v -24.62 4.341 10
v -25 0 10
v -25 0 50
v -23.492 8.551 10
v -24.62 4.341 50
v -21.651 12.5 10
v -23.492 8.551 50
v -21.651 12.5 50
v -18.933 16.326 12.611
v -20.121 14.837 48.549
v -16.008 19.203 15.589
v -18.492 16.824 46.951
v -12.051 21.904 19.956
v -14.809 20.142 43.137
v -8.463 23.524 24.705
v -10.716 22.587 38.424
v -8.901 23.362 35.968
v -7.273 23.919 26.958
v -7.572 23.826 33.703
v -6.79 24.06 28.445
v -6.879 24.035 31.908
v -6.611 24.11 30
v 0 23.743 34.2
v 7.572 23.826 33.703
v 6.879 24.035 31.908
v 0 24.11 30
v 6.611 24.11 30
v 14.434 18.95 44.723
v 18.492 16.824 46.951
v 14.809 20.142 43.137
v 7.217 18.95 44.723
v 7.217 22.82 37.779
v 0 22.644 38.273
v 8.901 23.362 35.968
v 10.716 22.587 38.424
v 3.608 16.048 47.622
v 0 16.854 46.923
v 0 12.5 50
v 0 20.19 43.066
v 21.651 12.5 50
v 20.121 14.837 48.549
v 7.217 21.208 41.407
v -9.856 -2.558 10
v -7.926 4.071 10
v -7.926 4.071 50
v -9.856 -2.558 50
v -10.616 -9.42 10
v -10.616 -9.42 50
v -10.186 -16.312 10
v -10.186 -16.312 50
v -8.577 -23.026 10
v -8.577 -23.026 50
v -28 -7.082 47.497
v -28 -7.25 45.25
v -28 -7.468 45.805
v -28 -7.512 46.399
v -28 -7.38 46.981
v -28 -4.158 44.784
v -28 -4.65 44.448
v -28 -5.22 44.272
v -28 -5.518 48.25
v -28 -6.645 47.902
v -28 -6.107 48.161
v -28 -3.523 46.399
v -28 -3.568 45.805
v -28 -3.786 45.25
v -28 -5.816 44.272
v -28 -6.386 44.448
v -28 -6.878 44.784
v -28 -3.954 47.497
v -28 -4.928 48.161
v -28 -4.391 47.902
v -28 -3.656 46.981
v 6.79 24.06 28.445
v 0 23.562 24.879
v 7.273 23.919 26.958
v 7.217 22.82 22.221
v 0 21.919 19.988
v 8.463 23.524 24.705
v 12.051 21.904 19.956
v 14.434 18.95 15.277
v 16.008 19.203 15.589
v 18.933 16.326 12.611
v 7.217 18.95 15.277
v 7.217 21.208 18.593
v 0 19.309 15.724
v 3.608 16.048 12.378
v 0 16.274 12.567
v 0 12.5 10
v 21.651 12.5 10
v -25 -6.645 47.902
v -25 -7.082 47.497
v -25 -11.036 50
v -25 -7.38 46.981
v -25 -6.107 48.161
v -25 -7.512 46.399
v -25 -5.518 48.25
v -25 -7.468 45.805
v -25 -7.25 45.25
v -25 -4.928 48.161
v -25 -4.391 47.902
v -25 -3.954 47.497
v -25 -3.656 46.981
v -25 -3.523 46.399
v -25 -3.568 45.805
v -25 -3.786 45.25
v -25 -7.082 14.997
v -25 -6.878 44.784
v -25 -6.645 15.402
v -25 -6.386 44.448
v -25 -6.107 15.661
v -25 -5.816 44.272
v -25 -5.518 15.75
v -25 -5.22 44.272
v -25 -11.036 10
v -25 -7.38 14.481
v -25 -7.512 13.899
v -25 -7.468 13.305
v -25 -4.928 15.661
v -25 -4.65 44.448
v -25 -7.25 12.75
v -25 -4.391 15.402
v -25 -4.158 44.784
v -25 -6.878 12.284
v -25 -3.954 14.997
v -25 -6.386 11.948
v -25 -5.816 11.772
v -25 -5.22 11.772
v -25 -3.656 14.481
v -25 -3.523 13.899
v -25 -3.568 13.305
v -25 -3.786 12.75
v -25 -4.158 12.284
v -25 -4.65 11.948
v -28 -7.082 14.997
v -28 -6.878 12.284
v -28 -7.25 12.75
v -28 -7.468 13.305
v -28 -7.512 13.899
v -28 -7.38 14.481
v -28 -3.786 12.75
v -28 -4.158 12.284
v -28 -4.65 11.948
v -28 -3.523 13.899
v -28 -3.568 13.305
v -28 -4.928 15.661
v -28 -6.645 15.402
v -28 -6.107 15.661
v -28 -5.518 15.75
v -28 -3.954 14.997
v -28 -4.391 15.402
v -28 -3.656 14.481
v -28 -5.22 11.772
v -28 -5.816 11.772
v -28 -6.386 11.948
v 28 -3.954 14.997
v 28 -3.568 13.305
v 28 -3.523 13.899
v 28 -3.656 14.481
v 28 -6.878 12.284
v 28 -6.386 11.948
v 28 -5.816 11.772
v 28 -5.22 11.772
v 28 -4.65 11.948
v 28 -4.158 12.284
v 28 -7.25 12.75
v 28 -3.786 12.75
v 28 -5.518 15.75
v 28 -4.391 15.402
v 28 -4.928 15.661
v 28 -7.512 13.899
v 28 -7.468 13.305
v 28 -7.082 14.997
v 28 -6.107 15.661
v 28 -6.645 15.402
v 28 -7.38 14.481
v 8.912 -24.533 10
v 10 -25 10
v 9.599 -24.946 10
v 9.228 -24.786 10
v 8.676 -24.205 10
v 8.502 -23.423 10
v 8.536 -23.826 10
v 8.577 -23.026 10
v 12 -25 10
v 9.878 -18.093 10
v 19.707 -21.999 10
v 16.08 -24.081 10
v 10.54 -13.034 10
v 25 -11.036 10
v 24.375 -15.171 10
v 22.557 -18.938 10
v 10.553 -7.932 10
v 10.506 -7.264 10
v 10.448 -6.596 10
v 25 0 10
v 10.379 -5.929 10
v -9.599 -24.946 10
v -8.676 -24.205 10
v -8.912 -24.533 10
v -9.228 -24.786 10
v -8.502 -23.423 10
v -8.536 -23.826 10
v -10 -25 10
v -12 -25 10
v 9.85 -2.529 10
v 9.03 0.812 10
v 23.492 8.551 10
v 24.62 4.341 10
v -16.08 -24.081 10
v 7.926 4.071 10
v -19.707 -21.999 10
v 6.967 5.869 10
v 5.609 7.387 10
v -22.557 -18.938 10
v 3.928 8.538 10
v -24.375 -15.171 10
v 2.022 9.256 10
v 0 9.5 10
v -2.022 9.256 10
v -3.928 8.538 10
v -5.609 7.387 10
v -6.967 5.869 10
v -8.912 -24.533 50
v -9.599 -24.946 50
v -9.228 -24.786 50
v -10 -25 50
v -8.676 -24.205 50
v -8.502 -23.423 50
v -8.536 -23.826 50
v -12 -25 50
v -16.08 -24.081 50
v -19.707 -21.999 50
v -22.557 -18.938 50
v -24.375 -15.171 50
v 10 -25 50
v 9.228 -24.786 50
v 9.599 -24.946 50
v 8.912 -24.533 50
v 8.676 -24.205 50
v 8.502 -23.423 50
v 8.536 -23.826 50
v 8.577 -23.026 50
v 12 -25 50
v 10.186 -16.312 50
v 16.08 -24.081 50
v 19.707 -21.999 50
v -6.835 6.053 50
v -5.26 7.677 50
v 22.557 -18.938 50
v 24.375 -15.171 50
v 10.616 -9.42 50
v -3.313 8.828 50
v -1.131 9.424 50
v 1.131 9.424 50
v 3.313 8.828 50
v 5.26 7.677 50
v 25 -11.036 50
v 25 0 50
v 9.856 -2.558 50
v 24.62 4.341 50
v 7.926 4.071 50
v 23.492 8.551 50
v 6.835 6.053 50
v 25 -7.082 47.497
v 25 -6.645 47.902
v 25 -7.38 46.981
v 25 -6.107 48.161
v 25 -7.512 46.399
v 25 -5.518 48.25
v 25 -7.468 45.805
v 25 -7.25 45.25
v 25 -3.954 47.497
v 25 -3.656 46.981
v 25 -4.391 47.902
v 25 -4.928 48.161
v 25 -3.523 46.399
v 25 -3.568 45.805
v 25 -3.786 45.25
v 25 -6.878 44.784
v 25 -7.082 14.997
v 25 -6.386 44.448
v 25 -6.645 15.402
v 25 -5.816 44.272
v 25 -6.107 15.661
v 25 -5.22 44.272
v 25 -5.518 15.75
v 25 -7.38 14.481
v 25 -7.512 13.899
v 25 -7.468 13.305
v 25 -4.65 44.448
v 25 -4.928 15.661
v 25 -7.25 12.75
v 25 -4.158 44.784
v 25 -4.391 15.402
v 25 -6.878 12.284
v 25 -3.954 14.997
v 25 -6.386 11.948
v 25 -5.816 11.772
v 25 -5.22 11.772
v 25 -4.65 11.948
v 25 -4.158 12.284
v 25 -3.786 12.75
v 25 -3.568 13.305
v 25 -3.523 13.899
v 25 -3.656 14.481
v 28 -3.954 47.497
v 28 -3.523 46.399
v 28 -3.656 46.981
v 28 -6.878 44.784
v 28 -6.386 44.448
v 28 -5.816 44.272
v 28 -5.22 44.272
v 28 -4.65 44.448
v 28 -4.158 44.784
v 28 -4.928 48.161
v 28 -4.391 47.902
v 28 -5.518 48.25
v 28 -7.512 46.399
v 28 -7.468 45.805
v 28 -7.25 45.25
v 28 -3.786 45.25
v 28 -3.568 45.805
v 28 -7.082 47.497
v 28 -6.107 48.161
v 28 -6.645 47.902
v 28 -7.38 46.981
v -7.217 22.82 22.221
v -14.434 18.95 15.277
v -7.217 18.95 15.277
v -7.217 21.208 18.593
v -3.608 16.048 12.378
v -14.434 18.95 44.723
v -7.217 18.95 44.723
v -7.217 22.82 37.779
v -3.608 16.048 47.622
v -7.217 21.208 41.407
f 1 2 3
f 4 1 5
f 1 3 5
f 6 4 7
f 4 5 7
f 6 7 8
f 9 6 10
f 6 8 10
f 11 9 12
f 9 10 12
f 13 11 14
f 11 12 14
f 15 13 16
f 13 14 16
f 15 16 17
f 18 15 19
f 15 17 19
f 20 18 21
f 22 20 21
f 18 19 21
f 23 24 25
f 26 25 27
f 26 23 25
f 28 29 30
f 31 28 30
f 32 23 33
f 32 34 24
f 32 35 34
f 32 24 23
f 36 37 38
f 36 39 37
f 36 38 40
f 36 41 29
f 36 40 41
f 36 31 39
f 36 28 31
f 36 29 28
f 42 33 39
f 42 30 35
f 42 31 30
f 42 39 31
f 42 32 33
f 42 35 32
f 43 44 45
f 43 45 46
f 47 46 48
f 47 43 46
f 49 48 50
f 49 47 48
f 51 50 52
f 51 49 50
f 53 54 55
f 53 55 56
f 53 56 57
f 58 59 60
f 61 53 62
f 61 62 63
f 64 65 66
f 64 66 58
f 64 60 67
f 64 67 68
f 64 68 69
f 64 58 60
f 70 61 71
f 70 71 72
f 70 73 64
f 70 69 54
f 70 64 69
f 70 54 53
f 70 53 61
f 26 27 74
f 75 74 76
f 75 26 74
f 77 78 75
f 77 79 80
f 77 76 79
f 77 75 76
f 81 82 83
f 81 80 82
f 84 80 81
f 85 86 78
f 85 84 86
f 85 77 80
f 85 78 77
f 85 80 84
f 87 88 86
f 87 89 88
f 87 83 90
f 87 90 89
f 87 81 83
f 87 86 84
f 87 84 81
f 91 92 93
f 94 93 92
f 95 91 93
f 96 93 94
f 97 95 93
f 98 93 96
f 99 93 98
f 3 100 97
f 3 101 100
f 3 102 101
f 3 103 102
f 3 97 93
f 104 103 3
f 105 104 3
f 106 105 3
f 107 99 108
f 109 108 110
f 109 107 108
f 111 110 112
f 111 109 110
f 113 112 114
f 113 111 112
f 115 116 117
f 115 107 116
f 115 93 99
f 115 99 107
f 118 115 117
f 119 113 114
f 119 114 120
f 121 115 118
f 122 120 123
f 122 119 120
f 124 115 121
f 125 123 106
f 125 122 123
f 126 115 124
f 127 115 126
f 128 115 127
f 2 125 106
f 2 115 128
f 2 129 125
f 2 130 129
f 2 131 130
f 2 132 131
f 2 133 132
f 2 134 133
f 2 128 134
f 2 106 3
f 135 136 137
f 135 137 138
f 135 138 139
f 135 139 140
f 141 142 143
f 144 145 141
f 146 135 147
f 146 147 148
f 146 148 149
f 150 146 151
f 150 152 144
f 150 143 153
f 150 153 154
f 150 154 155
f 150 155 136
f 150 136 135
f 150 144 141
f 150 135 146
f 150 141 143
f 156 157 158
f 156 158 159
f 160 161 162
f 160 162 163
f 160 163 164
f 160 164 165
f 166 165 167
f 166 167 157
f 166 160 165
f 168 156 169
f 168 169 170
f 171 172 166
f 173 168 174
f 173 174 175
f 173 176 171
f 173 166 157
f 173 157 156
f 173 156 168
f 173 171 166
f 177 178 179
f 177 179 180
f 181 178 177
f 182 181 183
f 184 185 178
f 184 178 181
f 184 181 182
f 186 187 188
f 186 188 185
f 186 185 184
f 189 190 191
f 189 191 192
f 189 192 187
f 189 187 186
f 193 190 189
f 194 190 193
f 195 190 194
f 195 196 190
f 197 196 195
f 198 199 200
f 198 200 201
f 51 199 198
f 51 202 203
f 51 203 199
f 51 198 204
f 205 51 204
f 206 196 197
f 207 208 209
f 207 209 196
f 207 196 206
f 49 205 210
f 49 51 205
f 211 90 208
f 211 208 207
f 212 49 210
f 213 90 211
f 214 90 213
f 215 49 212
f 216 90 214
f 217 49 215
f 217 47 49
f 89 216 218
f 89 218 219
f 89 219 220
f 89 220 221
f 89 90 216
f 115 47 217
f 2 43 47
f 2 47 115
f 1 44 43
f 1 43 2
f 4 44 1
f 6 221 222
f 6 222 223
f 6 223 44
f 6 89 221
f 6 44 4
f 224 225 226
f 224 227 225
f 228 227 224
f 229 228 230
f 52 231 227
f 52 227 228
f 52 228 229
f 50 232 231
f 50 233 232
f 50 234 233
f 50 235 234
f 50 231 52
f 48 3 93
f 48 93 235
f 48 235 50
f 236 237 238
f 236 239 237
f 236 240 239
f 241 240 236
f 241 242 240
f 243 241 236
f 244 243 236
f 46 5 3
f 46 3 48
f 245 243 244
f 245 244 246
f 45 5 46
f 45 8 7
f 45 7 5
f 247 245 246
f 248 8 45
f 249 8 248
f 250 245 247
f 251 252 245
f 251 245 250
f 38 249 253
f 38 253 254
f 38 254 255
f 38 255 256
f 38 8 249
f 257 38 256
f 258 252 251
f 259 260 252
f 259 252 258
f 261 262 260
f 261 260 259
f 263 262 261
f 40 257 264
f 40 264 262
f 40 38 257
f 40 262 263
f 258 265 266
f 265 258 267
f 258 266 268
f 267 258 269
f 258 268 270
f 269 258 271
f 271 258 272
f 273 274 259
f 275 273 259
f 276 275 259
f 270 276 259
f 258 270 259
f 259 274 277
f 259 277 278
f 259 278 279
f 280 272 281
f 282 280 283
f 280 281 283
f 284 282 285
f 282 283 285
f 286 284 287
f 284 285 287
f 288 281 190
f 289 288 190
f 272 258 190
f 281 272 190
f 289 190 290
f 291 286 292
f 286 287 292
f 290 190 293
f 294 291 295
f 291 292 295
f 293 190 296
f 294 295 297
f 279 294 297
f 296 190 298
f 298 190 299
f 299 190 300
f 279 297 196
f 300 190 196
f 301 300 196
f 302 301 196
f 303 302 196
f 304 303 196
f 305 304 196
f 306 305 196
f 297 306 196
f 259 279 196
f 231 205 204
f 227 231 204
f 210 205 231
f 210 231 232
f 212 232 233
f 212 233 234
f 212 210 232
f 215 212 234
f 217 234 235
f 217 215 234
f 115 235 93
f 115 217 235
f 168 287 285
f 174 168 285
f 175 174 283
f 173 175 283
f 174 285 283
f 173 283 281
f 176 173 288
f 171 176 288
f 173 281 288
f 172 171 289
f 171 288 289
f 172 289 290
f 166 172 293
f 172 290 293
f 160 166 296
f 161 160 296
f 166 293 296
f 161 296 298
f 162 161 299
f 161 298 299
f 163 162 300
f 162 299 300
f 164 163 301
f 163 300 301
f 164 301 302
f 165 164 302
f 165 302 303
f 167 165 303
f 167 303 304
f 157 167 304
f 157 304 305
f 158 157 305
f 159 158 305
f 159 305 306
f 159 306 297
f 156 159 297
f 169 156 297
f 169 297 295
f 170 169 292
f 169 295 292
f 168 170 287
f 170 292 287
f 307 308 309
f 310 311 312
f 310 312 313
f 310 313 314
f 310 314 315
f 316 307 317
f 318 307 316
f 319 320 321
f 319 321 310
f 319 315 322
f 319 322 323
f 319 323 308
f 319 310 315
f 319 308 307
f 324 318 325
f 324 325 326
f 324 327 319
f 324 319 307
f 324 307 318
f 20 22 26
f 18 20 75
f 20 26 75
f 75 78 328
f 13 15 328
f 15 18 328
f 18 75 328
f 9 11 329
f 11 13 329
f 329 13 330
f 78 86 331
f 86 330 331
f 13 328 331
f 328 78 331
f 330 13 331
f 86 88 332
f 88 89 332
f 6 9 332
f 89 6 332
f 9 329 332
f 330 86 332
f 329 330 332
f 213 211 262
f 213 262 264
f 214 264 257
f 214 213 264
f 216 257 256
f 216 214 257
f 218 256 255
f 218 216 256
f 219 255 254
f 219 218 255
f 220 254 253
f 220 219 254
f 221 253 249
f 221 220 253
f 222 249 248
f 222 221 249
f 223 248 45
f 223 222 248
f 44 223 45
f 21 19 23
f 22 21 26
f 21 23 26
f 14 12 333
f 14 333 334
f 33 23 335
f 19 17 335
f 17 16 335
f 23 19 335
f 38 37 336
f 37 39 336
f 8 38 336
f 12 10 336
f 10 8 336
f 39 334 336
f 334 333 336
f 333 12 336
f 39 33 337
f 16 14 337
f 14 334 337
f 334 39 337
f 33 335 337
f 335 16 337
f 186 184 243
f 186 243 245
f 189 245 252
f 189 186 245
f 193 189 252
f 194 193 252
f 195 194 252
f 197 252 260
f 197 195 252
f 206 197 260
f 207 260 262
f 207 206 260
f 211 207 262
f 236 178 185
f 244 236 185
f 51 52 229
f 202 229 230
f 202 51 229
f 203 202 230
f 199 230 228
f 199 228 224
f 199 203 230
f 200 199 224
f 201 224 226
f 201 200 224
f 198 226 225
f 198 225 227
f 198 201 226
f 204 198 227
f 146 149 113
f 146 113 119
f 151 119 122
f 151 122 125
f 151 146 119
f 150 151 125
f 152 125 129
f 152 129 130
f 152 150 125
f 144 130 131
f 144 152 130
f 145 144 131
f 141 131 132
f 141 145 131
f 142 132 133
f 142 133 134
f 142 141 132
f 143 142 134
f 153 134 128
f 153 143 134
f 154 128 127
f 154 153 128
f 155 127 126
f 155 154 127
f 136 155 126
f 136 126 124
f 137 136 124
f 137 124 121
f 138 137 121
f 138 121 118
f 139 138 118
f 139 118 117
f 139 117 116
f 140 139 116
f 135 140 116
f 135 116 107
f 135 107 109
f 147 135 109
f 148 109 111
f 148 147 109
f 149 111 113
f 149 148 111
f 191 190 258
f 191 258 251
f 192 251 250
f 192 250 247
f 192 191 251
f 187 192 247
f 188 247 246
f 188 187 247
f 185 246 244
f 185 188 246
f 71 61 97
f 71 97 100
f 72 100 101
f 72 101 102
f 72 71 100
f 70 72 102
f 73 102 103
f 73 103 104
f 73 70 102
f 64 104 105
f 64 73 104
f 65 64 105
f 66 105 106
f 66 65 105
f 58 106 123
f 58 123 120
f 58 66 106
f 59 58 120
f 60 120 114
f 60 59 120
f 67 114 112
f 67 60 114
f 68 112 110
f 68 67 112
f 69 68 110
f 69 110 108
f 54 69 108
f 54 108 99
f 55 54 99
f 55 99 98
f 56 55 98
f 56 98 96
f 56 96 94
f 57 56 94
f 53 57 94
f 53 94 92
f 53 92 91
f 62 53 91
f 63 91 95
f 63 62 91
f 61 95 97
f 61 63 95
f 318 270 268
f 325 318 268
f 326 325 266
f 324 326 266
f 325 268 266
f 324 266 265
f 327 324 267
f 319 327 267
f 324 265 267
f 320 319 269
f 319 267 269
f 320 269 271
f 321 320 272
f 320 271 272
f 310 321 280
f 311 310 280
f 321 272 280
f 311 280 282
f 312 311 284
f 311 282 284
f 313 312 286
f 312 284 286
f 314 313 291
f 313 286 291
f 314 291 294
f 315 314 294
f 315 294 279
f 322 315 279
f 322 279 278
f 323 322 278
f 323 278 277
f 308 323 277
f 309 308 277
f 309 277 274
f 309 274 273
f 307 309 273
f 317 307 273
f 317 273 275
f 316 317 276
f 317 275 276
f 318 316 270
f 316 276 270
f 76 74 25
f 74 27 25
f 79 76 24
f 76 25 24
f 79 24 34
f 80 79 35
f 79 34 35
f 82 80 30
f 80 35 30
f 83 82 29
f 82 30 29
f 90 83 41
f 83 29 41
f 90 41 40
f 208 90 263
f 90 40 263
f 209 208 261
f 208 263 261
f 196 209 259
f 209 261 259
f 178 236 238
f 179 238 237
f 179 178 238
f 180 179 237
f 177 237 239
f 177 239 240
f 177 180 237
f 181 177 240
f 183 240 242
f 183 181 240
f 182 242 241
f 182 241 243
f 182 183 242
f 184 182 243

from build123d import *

# Parameters (mm, degrees)
SKETCH1_W                           = 50
SKETCH1_H                           = 50
BOSS_EXTRUDE1_DEPTH                 = 60
CUT_EXTRUDE1_DEPTH                  = 60
CUT_EXTRUDE2_START                  = -60
CUT_EXTRUDE2_DEPTH                  = 60
SKETCH5_OUTSIDE_W                   = 70.548
SKETCH5_OUTSIDE_H                   = 70.548
CUT_EXTRUDE3_DEPTH                  = 10
CUT_EXTRUDE4_DEPTH                  = 10
FILLET1_R                           = 1
SKETCH7_R                           = 2
BOSS_EXTRUDE2_DEPTH                 = 2
BOSS_EXTRUDE3_START                 = 2
SKETCH8_R                           = 2
BOSS_EXTRUDE3_DEPTH                 = 2
SKETCH9_R                           = 2.25
CUT_EXTRUDE5_DEPTH                  = 2
CUT_EXTRUDE6_START                  = -2
SKETCH10_R                          = 2.25
CUT_EXTRUDE6_DEPTH                  = 2
FILLET2_R                           = 1
CUT_EXTRUDE7_REACH                  = 71.642
CUT_EXTRUDE7_END_RADIUS             = 25
CUT_EXTRUDE7_DIRECTION_2_REACH      = 71.642
CUT_EXTRUDE7_DIRECTION_2_END_RADIUS = 25
SKETCH12_W                          = 10
SKETCH12_H                          = 10
CUT_EXTRUDE8_DEPTH                  = 29.758852585
SKETCH13_W                          = 10
SKETCH13_H                          = 14.003619208
CUT_EXTRUDE9_DEPTH                  = 31.758852585
SKETCH14_R                          = 2
BOSS_EXTRUDE4_DEPTH                 = 3
BOSS_EXTRUDE5_START                 = 3
SKETCH15_R                          = 2
BOSS_EXTRUDE5_DEPTH                 = 3


# Read off the part's stored shape, not the designer's step: Cut-Extrude2
with BuildPart() as part:
    # Sketch1 → Boss-Extrude1 (new body)
    with BuildSketch(Plane.XY):
        Rectangle(SKETCH1_W, SKETCH1_H)
    extrude(amount=BOSS_EXTRUDE1_DEPTH)

    # Sketch3 → Cut-Extrude1 (cut)
    with BuildSketch(Plane.XY.offset(60)):
        with BuildLine():
            Line((-25, 25), (-25, 0))
            ThreePointArc((-25, 0), (-17.677669541, 17.677669518), (-3.2e-08, 25))
            Line((-3.2e-08, 25), (-25, 25))
        make_face()
        with BuildLine():
            Line((25, 25), (-3.2e-08, 25))
            ThreePointArc((-3.2e-08, 25), (17.677669518, 17.677669541), (25, 0))
            Line((25, 0), (25, 25))
        make_face()
    extrude(amount=-CUT_EXTRUDE1_DEPTH, mode=Mode.SUBTRACT)

    # Cut-Extrude2 outline → Cut-Extrude2 (cut)
    with BuildSketch(Plane.XY.offset(60).offset(CUT_EXTRUDE2_START)):
        with BuildLine():
            ThreePointArc((8.576916353, -23.025834486), (10.616475204, -9.420494413), (7.92577262, 4.071177033))
            ThreePointArc((7.92577262, 4.071177033), (0, 9.5), (-7.92577262, 4.071177033))
            ThreePointArc((-7.92577262, 4.071177033), (-10.616475204, -9.420494413), (-8.576916353, -23.025834486))
            ThreePointArc((-8.576916353, -23.025834486), (-8.783191003, -24.377140732), (-10, -25))
            Line((-10, -25), (10, -25))
            ThreePointArc((10, -25), (8.783191003, -24.377140732), (8.576916353, -23.025834486))
        make_face()
        with BuildLine():
            ThreePointArc((25, -11.035759956), (21.246950766, -20.57515197), (12, -25))
            Line((12, -25), (25, -25))
            Line((25, -25), (25, -11.035759956))
        make_face()
        with BuildLine():
            Line((-25, -25), (-12, -25))
            ThreePointArc((-12, -25), (-21.246950766, -20.57515197), (-25, -11.035759956))
            Line((-25, -11.035759956), (-25, -25))
        make_face()
    extrude(amount=CUT_EXTRUDE2_DEPTH, mode=Mode.SUBTRACT)

    # Sketch5 outside → Cut-Extrude3 (cut)
    with BuildSketch(Plane.XY.offset(60)):
        Rectangle(SKETCH5_OUTSIDE_W, SKETCH5_OUTSIDE_H)
        with BuildLine():
            Line((-7.92577262, 4.071177033), (-12.879426293, 4.071177033))
            Line((-12.879426293, 4.071177033), (-12.879426293, -5.928822967))
            Line((-12.879426293, -5.928822967), (-10.379426293, -5.928822967))
            ThreePointArc((-10.379426293, -5.928822967), (-9.475712618, -0.849542187), (-7.92577262, 4.071177033))
        make_face(mode=Mode.SUBTRACT)
        with BuildLine():
            Line((7.92577262, 4.071177033), (12.879426293, 4.071177033))
            Line((12.879426293, 4.071177033), (12.879426293, -5.928822967))
            Line((12.879426293, -5.928822967), (10.379426293, -5.928822967))
            ThreePointArc((10.379426293, -5.928822967), (9.475712618, -0.849542187), (7.92577262, 4.071177033))
        make_face(mode=Mode.SUBTRACT)
    extrude(amount=-CUT_EXTRUDE3_DEPTH, mode=Mode.SUBTRACT)

    # Sketch6 → Cut-Extrude4 (cut)
    # profile 1 of 4: a face of its own
    with BuildSketch(Plane(origin=(0, 0, 0), x_dir=(-1, 0, 0), z_dir=(0, 0, -1))):
        with BuildLine():
            Line((0, 9.5), (0, 25))
            ThreePointArc((0, 25), (-17.67766953, 17.67766953), (-25, 0))
            Line((-25, 0), (-25, -11.035759956))
            ThreePointArc((-25, -11.035759956), (-21.246950766, -20.57515197), (-12, -25))
            Line((-12, -25), (-10, -25))
            ThreePointArc((-10, -25), (-8.783191003, -24.377140732), (-8.576916353, -23.025834486))
            ThreePointArc((-8.576916353, -23.025834486), (-10.289550459, -15.574005024), (-10.552980025, -7.932442175))
            ThreePointArc((-10.552980025, -7.932442175), (-10.478797406, -6.929541656), (-10.379426293, -5.928822967))
            ThreePointArc((-10.379426293, -5.928822967), (-9.475712618, -0.849542187), (-7.92577262, 4.071177033))
            ThreePointArc((-7.92577262, 4.071177033), (-4.803383975, 8.012667281), (0, 9.5))
        make_face()
        with BuildLine():
            Line((-12.879426293, 6.071177033), (-12.879426293, 3.071177033))
            Line((-12.879426293, 3.071177033), (-12.879426293, -4.928822967))
            Line((-12.879426293, -4.928822967), (-12.879426293, -7.932442175))
            Line((-12.879426293, -7.932442175), (-14.879423018, -7.932442175))
            ThreePointArc((-14.879423018, -7.932442175), (-15.586532115, -7.639547997), (-15.879426293, -6.932438901))
            Line((-15.879426293, -6.932438901), (-15.879426293, 5.071173759))
            ThreePointArc((-15.879426293, 5.071173759), (-15.586532115, 5.778282855), (-14.879423018, 6.071177033))
            Line((-14.879423018, 6.071177033), (-12.879426293, 6.071177033))
        make_face(mode=Mode.SUBTRACT)
    # profile 2 of 4: a face of its own
    with BuildSketch(Plane(origin=(0, 0, 0), x_dir=(-1, 0, 0), z_dir=(0, 0, -1))):
        with BuildLine():
            ThreePointArc((25, 0), (17.67766953, 17.67766953), (0, 25))
            Line((0, 25), (0, 9.5))
            ThreePointArc((0, 9.5), (4.803383975, 8.012667281), (7.92577262, 4.071177033))
            ThreePointArc((7.92577262, 4.071177033), (10.616475204, -9.420494413), (8.576916353, -23.025834486))
            ThreePointArc((8.576916353, -23.025834486), (8.783191003, -24.377140732), (10, -25))
            Line((10, -25), (12, -25))
            ThreePointArc((12, -25), (21.246950766, -20.57515197), (25, -11.035759956))
            Line((25, -11.035759956), (25, 0))
        make_face()
        with BuildLine():
            Line((12.879426293, -4.928822967), (12.879426293, 3.071177033))
            Line((12.879426293, 3.071177033), (12.879426293, 6.071177033))
            Line((12.879426293, 6.071177033), (14.879423018, 6.071177033))
            ThreePointArc((14.879423018, 6.071177033), (15.586532115, 5.778282855), (15.879426293, 5.071173759))
            Line((15.879426293, 5.071173759), (15.879426293, -6.932438901))
            ThreePointArc((15.879426293, -6.932438901), (15.586532115, -7.639547997), (14.879423018, -7.932442175))
            Line((14.879423018, -7.932442175), (12.879426293, -7.932442175))
            Line((12.879426293, -7.932442175), (12.879426293, -4.928822967))
        make_face(mode=Mode.SUBTRACT)
    # profile 3 of 4: a face of its own
    with BuildSketch(Plane(origin=(0, 0, 0), x_dir=(-1, 0, 0), z_dir=(0, 0, -1))):
        with BuildLine():
            Line((0, 9.5), (0, 25))
            ThreePointArc((0, 25), (-17.67766953, 17.67766953), (-25, 0))
            Line((-25, 0), (-25, -11.035759956))
            ThreePointArc((-25, -11.035759956), (-21.246950766, -20.57515197), (-12, -25))
            Line((-12, -25), (-10, -25))
            ThreePointArc((-10, -25), (-8.783191003, -24.377140732), (-8.576916353, -23.025834486))
            ThreePointArc((-8.576916353, -23.025834486), (-10.289550459, -15.574005024), (-10.552980025, -7.932442175))
            ThreePointArc((-10.552980025, -7.932442175), (-10.478797406, -6.929541656), (-10.379426293, -5.928822967))
            ThreePointArc((-10.379426293, -5.928822967), (-9.475712618, -0.849542187), (-7.92577262, 4.071177033))
            ThreePointArc((-7.92577262, 4.071177033), (-4.803383975, 8.012667281), (0, 9.5))
        make_face()
        with BuildLine():
            Line((-12.879426293, 6.071177033), (-12.879426293, 3.071177033))
            Line((-12.879426293, 3.071177033), (-12.879426293, -4.928822967))
            Line((-12.879426293, -4.928822967), (-12.879426293, -7.932442175))
            Line((-12.879426293, -7.932442175), (-14.879423018, -7.932442175))
            ThreePointArc((-14.879423018, -7.932442175), (-15.586532115, -7.639547997), (-15.879426293, -6.932438901))
            Line((-15.879426293, -6.932438901), (-15.879426293, 5.071173759))
            ThreePointArc((-15.879426293, 5.071173759), (-15.586532115, 5.778282855), (-14.879423018, 6.071177033))
            Line((-14.879423018, 6.071177033), (-12.879426293, 6.071177033))
        make_face(mode=Mode.SUBTRACT)
    # profile 4 of 4: a face of its own
    with BuildSketch(Plane(origin=(0, 0, 0), x_dir=(-1, 0, 0), z_dir=(0, 0, -1))):
        with BuildLine():
            ThreePointArc((25, 0), (17.67766953, 17.67766953), (0, 25))
            Line((0, 25), (0, 9.5))
            ThreePointArc((0, 9.5), (4.803383975, 8.012667281), (7.92577262, 4.071177033))
            ThreePointArc((7.92577262, 4.071177033), (10.616475204, -9.420494413), (8.576916353, -23.025834486))
            ThreePointArc((8.576916353, -23.025834486), (8.783191003, -24.377140732), (10, -25))
            Line((10, -25), (12, -25))
            ThreePointArc((12, -25), (21.246950766, -20.57515197), (25, -11.035759956))
            Line((25, -11.035759956), (25, 0))
        make_face()
        with BuildLine():
            Line((12.879426293, -4.928822967), (12.879426293, 3.071177033))
            Line((12.879426293, 3.071177033), (12.879426293, 6.071177033))
            Line((12.879426293, 6.071177033), (14.879423018, 6.071177033))
            ThreePointArc((14.879423018, 6.071177033), (15.586532115, 5.778282855), (15.879426293, 5.071173759))
            Line((15.879426293, 5.071173759), (15.879426293, -6.932438901))
            ThreePointArc((15.879426293, -6.932438901), (15.586532115, -7.639547997), (14.879423018, -7.932442175))
            Line((14.879423018, -7.932442175), (12.879426293, -7.932442175))
            Line((12.879426293, -7.932442175), (12.879426293, -4.928822967))
        make_face(mode=Mode.SUBTRACT)
    extrude(amount=-CUT_EXTRUDE4_DEPTH, mode=Mode.SUBTRACT)

    # Fillet1
    fillet1_edges = [part.edges().sort_by_distance(p)[0] for p in [
        (12.879426293, 4.071177033, 55),
        (12.879426293, -5.928822967, 55),
        (-12.879426293, -5.928822967, 55),
        (-12.879426293, 4.071177033, 55),
    ]]
    fillet(fillet1_edges, radius=FILLET1_R)

    # Sketch7 → Boss-Extrude2 (add)
    with BuildSketch(Plane.ZY.offset(12.879426293)):
        with Locations(Location((55, -0.928822967, 0), (0, 0, 270))):
            Circle(SKETCH7_R)
    extrude(amount=BOSS_EXTRUDE2_DEPTH)

    # Sketch8 → Boss-Extrude3 (add)
    with BuildSketch(Plane(origin=(12.879426293, 0, 0), x_dir=(0, 0, -1), z_dir=(1, 0, 0)).offset(BOSS_EXTRUDE3_START)):
        with Locations(Location((-55, -0.928822967, 0), (0, 0, 270))):
            Circle(SKETCH8_R)
    extrude(amount=-BOSS_EXTRUDE3_DEPTH)

    # Sketch9 → Cut-Extrude5 (cut)
    with BuildSketch(Plane.ZY.offset(-12.879426293)):
        with Locations(Location((5, -0.930632571, 0), (0, 0, 270))):
            Circle(SKETCH9_R)
    extrude(amount=-CUT_EXTRUDE5_DEPTH, mode=Mode.SUBTRACT)

    # Sketch10 → Cut-Extrude6 (cut)
    with BuildSketch(Plane(origin=(-12.879426293, 0, 0), x_dir=(0, 0, -1), z_dir=(1, 0, 0)).offset(CUT_EXTRUDE6_START)):
        with Locations(Location((-5, -0.930632571, 0), (0, 0, 270))):
            Circle(SKETCH10_R)
    extrude(amount=CUT_EXTRUDE6_DEPTH, mode=Mode.SUBTRACT)

    # Fillet2
    fillet2_edges = [part.edges().sort_by_distance(p)[0] for p in [
        (-12.879426293, 6.071177033, 5),
        (-12.879426293, -7.932442175, 5),
        (12.879426293, -7.932442175, 5),
        (12.879426293, 6.071177033, 5),
    ]]
    fillet(fillet2_edges, radius=FILLET2_R)

    # Cut-Extrude7: up to this cylinder (the profile starts inside it)
    cut_extrude7_end = Plane(origin=(0, 0, 27.7442175), z_dir=(0, 0, 1)) * Cylinder(CUT_EXTRUDE7_END_RADIUS, 227.198087, mode=Mode.PRIVATE)
    # Sketch11 → Cut-Extrude7 (cut, up to the surface)
    with BuildSketch(Plane(origin=(0, 0, 0), x_dir=(0, 0, -1), z_dir=(1, 0, 0)), mode=Mode.PRIVATE) as cut_extrude7_sk1:
        with BuildLine():
            add(Edge.make_bspline(
                [(-50, 12.5), (-45.835040113, 20.240050977), (-37.917520056, 24.110076465), (-30, 24.110076465)],
                knots=[0, 0, 0, 0, 0.5, 0.5, 0.5, 0.5], degree=3))
            Line((-30, 24.110076465), (-30, 25))
            Line((-30, 25), (-50, 25))
            Line((-50, 25), (-50, 12.5))
        make_face()
    cut_extrude7_tool1 = extrude(cut_extrude7_sk1.sketch, amount=CUT_EXTRUDE7_REACH, mode=Mode.PRIVATE) & cut_extrude7_end
    add(cut_extrude7_tool1.solids().sort_by_distance((0, 21.671006, 44.201261))[0], mode=Mode.SUBTRACT)
    # Sketch11 → Cut-Extrude7 (cut, up to the surface)
    with BuildSketch(Plane(origin=(0, 0, 0), x_dir=(0, 0, -1), z_dir=(1, 0, 0)), mode=Mode.PRIVATE) as cut_extrude7_sk2:
        with BuildLine():
            add(Edge.make_bspline(
                [(-30, 24.110076465), (-22.082479944, 24.110076465), (-14.164959887, 20.240050977), (-10, 12.5)],
                knots=[0.5, 0.5, 0.5, 0.5, 1, 1, 1, 1], degree=3))
            ThreePointArc((-10, 12.5), (-11.128726859, 19.123824427), (-14.387505004, 25))
            Line((-14.387505004, 25), (-30, 25))
            Line((-30, 25), (-30, 24.110076465))
        make_face()
    cut_extrude7_tool2 = extrude(cut_extrude7_sk2.sketch, amount=CUT_EXTRUDE7_REACH, mode=Mode.PRIVATE) & cut_extrude7_end
    add(cut_extrude7_tool2.solids().sort_by_distance((0, 21.59828, 16.984521))[0], mode=Mode.SUBTRACT)
    # Sketch11 → Cut-Extrude7 (cut, up to the surface)
    with BuildSketch(Plane(origin=(0, 0, 0), x_dir=(0, 0, -1), z_dir=(1, 0, 0)), mode=Mode.PRIVATE) as cut_extrude7_sk3:
        with BuildLine():
            ThreePointArc((-14.387505004, 25), (-11.128726859, 19.123824427), (-10, 12.5))
            Line((-10, 12.5), (-10, 25))
            Line((-10, 25), (-14.387505004, 25))
        make_face()
    cut_extrude7_tool3 = extrude(cut_extrude7_sk3.sketch, amount=CUT_EXTRUDE7_REACH, mode=Mode.PRIVATE) & cut_extrude7_end
    add(cut_extrude7_tool3.solids().sort_by_distance((0, 21.947708, 11.287174))[0], mode=Mode.SUBTRACT)

    # Cut-Extrude7 direction 2: up to this cylinder (the profile starts inside it)
    cut_extrude7_direction_2_end = Plane(origin=(0, 0, 27.7442175), z_dir=(0, 0, 1)) * Cylinder(CUT_EXTRUDE7_DIRECTION_2_END_RADIUS, 227.198087, mode=Mode.PRIVATE)
    # Sketch11 → Cut-Extrude7 direction 2 (cut, up to the surface)
    with BuildSketch(Plane(origin=(0, 0, 0), x_dir=(0, 0, -1), z_dir=(1, 0, 0)), mode=Mode.PRIVATE) as cut_extrude7_direction_2_sk1:
        with BuildLine():
            add(Edge.make_bspline(
                [(-50, 12.5), (-45.835040113, 20.240050977), (-37.917520056, 24.110076465), (-30, 24.110076465)],
                knots=[0, 0, 0, 0, 0.5, 0.5, 0.5, 0.5], degree=3))
            Line((-30, 24.110076465), (-30, 25))
            Line((-30, 25), (-50, 25))
            Line((-50, 25), (-50, 12.5))
        make_face()
    cut_extrude7_direction_2_tool1 = extrude(cut_extrude7_direction_2_sk1.sketch, amount=-CUT_EXTRUDE7_DIRECTION_2_REACH, mode=Mode.PRIVATE) & cut_extrude7_direction_2_end
    add(cut_extrude7_direction_2_tool1.solids().sort_by_distance((0, 21.671006, 44.201261))[0], mode=Mode.SUBTRACT)
    # Sketch11 → Cut-Extrude7 direction 2 (cut, up to the surface)
    with BuildSketch(Plane(origin=(0, 0, 0), x_dir=(0, 0, -1), z_dir=(1, 0, 0)), mode=Mode.PRIVATE) as cut_extrude7_direction_2_sk2:
        with BuildLine():
            add(Edge.make_bspline(
                [(-30, 24.110076465), (-22.082479944, 24.110076465), (-14.164959887, 20.240050977), (-10, 12.5)],
                knots=[0.5, 0.5, 0.5, 0.5, 1, 1, 1, 1], degree=3))
            ThreePointArc((-10, 12.5), (-11.128726859, 19.123824427), (-14.387505004, 25))
            Line((-14.387505004, 25), (-30, 25))
            Line((-30, 25), (-30, 24.110076465))
        make_face()
    cut_extrude7_direction_2_tool2 = extrude(cut_extrude7_direction_2_sk2.sketch, amount=-CUT_EXTRUDE7_DIRECTION_2_REACH, mode=Mode.PRIVATE) & cut_extrude7_direction_2_end
    add(cut_extrude7_direction_2_tool2.solids().sort_by_distance((0, 21.59828, 16.984521))[0], mode=Mode.SUBTRACT)
    # Sketch11 → Cut-Extrude7 direction 2 (cut, up to the surface)
    with BuildSketch(Plane(origin=(0, 0, 0), x_dir=(0, 0, -1), z_dir=(1, 0, 0)), mode=Mode.PRIVATE) as cut_extrude7_direction_2_sk3:
        with BuildLine():
            ThreePointArc((-14.387505004, 25), (-11.128726859, 19.123824427), (-10, 12.5))
            Line((-10, 12.5), (-10, 25))
            Line((-10, 25), (-14.387505004, 25))
        make_face()
    cut_extrude7_direction_2_tool3 = extrude(cut_extrude7_direction_2_sk3.sketch, amount=-CUT_EXTRUDE7_DIRECTION_2_REACH, mode=Mode.PRIVATE) & cut_extrude7_direction_2_end
    add(cut_extrude7_direction_2_tool3.solids().sort_by_distance((0, 21.947708, 11.287174))[0], mode=Mode.SUBTRACT)

    # Sketch12 → Cut-Extrude8 (cut)
    with BuildSketch(Plane(origin=(14.879426293, 0, 0), x_dir=(0, 0, -1), z_dir=(1, 0, 0))):
        with Locations((-55, -0.928822967)):
            Rectangle(SKETCH12_W, SKETCH12_H)
    extrude(amount=-CUT_EXTRUDE8_DEPTH, mode=Mode.SUBTRACT)

    # Sketch13 → Cut-Extrude9 (cut)
    with BuildSketch(Plane(origin=(15.879426293, 0, 0), x_dir=(0, 0, -1), z_dir=(1, 0, 0))):
        with Locations((-5, -0.930632571)):
            Rectangle(SKETCH13_W, SKETCH13_H)
    extrude(amount=-CUT_EXTRUDE9_DEPTH, mode=Mode.SUBTRACT)

    # Sketch14 → Boss-Extrude4 (add)
    with BuildSketch(Plane(origin=(25, 0, 0), x_dir=(0, 0, -1), z_dir=(1, 0, 0))):
        with Locations(Location((-13.75, -5.517879978, 0), (0, 0, 180))):
            Circle(SKETCH14_R)
        with Locations(Location((-46.25, -5.517879978, 0), (0, 0, 180))):
            Circle(SKETCH14_R)
    extrude(amount=BOSS_EXTRUDE4_DEPTH)

    # Sketch15 → Boss-Extrude5 (add)
    with BuildSketch(Plane.ZY.offset(25).offset(BOSS_EXTRUDE5_START)):
        with Locations((13.75, -5.517879978)):
            Circle(SKETCH15_R)
        with Locations((46.25, -5.517879978)):
            Circle(SKETCH15_R)
    extrude(amount=-BOSS_EXTRUDE5_DEPTH)


solid = part.part
